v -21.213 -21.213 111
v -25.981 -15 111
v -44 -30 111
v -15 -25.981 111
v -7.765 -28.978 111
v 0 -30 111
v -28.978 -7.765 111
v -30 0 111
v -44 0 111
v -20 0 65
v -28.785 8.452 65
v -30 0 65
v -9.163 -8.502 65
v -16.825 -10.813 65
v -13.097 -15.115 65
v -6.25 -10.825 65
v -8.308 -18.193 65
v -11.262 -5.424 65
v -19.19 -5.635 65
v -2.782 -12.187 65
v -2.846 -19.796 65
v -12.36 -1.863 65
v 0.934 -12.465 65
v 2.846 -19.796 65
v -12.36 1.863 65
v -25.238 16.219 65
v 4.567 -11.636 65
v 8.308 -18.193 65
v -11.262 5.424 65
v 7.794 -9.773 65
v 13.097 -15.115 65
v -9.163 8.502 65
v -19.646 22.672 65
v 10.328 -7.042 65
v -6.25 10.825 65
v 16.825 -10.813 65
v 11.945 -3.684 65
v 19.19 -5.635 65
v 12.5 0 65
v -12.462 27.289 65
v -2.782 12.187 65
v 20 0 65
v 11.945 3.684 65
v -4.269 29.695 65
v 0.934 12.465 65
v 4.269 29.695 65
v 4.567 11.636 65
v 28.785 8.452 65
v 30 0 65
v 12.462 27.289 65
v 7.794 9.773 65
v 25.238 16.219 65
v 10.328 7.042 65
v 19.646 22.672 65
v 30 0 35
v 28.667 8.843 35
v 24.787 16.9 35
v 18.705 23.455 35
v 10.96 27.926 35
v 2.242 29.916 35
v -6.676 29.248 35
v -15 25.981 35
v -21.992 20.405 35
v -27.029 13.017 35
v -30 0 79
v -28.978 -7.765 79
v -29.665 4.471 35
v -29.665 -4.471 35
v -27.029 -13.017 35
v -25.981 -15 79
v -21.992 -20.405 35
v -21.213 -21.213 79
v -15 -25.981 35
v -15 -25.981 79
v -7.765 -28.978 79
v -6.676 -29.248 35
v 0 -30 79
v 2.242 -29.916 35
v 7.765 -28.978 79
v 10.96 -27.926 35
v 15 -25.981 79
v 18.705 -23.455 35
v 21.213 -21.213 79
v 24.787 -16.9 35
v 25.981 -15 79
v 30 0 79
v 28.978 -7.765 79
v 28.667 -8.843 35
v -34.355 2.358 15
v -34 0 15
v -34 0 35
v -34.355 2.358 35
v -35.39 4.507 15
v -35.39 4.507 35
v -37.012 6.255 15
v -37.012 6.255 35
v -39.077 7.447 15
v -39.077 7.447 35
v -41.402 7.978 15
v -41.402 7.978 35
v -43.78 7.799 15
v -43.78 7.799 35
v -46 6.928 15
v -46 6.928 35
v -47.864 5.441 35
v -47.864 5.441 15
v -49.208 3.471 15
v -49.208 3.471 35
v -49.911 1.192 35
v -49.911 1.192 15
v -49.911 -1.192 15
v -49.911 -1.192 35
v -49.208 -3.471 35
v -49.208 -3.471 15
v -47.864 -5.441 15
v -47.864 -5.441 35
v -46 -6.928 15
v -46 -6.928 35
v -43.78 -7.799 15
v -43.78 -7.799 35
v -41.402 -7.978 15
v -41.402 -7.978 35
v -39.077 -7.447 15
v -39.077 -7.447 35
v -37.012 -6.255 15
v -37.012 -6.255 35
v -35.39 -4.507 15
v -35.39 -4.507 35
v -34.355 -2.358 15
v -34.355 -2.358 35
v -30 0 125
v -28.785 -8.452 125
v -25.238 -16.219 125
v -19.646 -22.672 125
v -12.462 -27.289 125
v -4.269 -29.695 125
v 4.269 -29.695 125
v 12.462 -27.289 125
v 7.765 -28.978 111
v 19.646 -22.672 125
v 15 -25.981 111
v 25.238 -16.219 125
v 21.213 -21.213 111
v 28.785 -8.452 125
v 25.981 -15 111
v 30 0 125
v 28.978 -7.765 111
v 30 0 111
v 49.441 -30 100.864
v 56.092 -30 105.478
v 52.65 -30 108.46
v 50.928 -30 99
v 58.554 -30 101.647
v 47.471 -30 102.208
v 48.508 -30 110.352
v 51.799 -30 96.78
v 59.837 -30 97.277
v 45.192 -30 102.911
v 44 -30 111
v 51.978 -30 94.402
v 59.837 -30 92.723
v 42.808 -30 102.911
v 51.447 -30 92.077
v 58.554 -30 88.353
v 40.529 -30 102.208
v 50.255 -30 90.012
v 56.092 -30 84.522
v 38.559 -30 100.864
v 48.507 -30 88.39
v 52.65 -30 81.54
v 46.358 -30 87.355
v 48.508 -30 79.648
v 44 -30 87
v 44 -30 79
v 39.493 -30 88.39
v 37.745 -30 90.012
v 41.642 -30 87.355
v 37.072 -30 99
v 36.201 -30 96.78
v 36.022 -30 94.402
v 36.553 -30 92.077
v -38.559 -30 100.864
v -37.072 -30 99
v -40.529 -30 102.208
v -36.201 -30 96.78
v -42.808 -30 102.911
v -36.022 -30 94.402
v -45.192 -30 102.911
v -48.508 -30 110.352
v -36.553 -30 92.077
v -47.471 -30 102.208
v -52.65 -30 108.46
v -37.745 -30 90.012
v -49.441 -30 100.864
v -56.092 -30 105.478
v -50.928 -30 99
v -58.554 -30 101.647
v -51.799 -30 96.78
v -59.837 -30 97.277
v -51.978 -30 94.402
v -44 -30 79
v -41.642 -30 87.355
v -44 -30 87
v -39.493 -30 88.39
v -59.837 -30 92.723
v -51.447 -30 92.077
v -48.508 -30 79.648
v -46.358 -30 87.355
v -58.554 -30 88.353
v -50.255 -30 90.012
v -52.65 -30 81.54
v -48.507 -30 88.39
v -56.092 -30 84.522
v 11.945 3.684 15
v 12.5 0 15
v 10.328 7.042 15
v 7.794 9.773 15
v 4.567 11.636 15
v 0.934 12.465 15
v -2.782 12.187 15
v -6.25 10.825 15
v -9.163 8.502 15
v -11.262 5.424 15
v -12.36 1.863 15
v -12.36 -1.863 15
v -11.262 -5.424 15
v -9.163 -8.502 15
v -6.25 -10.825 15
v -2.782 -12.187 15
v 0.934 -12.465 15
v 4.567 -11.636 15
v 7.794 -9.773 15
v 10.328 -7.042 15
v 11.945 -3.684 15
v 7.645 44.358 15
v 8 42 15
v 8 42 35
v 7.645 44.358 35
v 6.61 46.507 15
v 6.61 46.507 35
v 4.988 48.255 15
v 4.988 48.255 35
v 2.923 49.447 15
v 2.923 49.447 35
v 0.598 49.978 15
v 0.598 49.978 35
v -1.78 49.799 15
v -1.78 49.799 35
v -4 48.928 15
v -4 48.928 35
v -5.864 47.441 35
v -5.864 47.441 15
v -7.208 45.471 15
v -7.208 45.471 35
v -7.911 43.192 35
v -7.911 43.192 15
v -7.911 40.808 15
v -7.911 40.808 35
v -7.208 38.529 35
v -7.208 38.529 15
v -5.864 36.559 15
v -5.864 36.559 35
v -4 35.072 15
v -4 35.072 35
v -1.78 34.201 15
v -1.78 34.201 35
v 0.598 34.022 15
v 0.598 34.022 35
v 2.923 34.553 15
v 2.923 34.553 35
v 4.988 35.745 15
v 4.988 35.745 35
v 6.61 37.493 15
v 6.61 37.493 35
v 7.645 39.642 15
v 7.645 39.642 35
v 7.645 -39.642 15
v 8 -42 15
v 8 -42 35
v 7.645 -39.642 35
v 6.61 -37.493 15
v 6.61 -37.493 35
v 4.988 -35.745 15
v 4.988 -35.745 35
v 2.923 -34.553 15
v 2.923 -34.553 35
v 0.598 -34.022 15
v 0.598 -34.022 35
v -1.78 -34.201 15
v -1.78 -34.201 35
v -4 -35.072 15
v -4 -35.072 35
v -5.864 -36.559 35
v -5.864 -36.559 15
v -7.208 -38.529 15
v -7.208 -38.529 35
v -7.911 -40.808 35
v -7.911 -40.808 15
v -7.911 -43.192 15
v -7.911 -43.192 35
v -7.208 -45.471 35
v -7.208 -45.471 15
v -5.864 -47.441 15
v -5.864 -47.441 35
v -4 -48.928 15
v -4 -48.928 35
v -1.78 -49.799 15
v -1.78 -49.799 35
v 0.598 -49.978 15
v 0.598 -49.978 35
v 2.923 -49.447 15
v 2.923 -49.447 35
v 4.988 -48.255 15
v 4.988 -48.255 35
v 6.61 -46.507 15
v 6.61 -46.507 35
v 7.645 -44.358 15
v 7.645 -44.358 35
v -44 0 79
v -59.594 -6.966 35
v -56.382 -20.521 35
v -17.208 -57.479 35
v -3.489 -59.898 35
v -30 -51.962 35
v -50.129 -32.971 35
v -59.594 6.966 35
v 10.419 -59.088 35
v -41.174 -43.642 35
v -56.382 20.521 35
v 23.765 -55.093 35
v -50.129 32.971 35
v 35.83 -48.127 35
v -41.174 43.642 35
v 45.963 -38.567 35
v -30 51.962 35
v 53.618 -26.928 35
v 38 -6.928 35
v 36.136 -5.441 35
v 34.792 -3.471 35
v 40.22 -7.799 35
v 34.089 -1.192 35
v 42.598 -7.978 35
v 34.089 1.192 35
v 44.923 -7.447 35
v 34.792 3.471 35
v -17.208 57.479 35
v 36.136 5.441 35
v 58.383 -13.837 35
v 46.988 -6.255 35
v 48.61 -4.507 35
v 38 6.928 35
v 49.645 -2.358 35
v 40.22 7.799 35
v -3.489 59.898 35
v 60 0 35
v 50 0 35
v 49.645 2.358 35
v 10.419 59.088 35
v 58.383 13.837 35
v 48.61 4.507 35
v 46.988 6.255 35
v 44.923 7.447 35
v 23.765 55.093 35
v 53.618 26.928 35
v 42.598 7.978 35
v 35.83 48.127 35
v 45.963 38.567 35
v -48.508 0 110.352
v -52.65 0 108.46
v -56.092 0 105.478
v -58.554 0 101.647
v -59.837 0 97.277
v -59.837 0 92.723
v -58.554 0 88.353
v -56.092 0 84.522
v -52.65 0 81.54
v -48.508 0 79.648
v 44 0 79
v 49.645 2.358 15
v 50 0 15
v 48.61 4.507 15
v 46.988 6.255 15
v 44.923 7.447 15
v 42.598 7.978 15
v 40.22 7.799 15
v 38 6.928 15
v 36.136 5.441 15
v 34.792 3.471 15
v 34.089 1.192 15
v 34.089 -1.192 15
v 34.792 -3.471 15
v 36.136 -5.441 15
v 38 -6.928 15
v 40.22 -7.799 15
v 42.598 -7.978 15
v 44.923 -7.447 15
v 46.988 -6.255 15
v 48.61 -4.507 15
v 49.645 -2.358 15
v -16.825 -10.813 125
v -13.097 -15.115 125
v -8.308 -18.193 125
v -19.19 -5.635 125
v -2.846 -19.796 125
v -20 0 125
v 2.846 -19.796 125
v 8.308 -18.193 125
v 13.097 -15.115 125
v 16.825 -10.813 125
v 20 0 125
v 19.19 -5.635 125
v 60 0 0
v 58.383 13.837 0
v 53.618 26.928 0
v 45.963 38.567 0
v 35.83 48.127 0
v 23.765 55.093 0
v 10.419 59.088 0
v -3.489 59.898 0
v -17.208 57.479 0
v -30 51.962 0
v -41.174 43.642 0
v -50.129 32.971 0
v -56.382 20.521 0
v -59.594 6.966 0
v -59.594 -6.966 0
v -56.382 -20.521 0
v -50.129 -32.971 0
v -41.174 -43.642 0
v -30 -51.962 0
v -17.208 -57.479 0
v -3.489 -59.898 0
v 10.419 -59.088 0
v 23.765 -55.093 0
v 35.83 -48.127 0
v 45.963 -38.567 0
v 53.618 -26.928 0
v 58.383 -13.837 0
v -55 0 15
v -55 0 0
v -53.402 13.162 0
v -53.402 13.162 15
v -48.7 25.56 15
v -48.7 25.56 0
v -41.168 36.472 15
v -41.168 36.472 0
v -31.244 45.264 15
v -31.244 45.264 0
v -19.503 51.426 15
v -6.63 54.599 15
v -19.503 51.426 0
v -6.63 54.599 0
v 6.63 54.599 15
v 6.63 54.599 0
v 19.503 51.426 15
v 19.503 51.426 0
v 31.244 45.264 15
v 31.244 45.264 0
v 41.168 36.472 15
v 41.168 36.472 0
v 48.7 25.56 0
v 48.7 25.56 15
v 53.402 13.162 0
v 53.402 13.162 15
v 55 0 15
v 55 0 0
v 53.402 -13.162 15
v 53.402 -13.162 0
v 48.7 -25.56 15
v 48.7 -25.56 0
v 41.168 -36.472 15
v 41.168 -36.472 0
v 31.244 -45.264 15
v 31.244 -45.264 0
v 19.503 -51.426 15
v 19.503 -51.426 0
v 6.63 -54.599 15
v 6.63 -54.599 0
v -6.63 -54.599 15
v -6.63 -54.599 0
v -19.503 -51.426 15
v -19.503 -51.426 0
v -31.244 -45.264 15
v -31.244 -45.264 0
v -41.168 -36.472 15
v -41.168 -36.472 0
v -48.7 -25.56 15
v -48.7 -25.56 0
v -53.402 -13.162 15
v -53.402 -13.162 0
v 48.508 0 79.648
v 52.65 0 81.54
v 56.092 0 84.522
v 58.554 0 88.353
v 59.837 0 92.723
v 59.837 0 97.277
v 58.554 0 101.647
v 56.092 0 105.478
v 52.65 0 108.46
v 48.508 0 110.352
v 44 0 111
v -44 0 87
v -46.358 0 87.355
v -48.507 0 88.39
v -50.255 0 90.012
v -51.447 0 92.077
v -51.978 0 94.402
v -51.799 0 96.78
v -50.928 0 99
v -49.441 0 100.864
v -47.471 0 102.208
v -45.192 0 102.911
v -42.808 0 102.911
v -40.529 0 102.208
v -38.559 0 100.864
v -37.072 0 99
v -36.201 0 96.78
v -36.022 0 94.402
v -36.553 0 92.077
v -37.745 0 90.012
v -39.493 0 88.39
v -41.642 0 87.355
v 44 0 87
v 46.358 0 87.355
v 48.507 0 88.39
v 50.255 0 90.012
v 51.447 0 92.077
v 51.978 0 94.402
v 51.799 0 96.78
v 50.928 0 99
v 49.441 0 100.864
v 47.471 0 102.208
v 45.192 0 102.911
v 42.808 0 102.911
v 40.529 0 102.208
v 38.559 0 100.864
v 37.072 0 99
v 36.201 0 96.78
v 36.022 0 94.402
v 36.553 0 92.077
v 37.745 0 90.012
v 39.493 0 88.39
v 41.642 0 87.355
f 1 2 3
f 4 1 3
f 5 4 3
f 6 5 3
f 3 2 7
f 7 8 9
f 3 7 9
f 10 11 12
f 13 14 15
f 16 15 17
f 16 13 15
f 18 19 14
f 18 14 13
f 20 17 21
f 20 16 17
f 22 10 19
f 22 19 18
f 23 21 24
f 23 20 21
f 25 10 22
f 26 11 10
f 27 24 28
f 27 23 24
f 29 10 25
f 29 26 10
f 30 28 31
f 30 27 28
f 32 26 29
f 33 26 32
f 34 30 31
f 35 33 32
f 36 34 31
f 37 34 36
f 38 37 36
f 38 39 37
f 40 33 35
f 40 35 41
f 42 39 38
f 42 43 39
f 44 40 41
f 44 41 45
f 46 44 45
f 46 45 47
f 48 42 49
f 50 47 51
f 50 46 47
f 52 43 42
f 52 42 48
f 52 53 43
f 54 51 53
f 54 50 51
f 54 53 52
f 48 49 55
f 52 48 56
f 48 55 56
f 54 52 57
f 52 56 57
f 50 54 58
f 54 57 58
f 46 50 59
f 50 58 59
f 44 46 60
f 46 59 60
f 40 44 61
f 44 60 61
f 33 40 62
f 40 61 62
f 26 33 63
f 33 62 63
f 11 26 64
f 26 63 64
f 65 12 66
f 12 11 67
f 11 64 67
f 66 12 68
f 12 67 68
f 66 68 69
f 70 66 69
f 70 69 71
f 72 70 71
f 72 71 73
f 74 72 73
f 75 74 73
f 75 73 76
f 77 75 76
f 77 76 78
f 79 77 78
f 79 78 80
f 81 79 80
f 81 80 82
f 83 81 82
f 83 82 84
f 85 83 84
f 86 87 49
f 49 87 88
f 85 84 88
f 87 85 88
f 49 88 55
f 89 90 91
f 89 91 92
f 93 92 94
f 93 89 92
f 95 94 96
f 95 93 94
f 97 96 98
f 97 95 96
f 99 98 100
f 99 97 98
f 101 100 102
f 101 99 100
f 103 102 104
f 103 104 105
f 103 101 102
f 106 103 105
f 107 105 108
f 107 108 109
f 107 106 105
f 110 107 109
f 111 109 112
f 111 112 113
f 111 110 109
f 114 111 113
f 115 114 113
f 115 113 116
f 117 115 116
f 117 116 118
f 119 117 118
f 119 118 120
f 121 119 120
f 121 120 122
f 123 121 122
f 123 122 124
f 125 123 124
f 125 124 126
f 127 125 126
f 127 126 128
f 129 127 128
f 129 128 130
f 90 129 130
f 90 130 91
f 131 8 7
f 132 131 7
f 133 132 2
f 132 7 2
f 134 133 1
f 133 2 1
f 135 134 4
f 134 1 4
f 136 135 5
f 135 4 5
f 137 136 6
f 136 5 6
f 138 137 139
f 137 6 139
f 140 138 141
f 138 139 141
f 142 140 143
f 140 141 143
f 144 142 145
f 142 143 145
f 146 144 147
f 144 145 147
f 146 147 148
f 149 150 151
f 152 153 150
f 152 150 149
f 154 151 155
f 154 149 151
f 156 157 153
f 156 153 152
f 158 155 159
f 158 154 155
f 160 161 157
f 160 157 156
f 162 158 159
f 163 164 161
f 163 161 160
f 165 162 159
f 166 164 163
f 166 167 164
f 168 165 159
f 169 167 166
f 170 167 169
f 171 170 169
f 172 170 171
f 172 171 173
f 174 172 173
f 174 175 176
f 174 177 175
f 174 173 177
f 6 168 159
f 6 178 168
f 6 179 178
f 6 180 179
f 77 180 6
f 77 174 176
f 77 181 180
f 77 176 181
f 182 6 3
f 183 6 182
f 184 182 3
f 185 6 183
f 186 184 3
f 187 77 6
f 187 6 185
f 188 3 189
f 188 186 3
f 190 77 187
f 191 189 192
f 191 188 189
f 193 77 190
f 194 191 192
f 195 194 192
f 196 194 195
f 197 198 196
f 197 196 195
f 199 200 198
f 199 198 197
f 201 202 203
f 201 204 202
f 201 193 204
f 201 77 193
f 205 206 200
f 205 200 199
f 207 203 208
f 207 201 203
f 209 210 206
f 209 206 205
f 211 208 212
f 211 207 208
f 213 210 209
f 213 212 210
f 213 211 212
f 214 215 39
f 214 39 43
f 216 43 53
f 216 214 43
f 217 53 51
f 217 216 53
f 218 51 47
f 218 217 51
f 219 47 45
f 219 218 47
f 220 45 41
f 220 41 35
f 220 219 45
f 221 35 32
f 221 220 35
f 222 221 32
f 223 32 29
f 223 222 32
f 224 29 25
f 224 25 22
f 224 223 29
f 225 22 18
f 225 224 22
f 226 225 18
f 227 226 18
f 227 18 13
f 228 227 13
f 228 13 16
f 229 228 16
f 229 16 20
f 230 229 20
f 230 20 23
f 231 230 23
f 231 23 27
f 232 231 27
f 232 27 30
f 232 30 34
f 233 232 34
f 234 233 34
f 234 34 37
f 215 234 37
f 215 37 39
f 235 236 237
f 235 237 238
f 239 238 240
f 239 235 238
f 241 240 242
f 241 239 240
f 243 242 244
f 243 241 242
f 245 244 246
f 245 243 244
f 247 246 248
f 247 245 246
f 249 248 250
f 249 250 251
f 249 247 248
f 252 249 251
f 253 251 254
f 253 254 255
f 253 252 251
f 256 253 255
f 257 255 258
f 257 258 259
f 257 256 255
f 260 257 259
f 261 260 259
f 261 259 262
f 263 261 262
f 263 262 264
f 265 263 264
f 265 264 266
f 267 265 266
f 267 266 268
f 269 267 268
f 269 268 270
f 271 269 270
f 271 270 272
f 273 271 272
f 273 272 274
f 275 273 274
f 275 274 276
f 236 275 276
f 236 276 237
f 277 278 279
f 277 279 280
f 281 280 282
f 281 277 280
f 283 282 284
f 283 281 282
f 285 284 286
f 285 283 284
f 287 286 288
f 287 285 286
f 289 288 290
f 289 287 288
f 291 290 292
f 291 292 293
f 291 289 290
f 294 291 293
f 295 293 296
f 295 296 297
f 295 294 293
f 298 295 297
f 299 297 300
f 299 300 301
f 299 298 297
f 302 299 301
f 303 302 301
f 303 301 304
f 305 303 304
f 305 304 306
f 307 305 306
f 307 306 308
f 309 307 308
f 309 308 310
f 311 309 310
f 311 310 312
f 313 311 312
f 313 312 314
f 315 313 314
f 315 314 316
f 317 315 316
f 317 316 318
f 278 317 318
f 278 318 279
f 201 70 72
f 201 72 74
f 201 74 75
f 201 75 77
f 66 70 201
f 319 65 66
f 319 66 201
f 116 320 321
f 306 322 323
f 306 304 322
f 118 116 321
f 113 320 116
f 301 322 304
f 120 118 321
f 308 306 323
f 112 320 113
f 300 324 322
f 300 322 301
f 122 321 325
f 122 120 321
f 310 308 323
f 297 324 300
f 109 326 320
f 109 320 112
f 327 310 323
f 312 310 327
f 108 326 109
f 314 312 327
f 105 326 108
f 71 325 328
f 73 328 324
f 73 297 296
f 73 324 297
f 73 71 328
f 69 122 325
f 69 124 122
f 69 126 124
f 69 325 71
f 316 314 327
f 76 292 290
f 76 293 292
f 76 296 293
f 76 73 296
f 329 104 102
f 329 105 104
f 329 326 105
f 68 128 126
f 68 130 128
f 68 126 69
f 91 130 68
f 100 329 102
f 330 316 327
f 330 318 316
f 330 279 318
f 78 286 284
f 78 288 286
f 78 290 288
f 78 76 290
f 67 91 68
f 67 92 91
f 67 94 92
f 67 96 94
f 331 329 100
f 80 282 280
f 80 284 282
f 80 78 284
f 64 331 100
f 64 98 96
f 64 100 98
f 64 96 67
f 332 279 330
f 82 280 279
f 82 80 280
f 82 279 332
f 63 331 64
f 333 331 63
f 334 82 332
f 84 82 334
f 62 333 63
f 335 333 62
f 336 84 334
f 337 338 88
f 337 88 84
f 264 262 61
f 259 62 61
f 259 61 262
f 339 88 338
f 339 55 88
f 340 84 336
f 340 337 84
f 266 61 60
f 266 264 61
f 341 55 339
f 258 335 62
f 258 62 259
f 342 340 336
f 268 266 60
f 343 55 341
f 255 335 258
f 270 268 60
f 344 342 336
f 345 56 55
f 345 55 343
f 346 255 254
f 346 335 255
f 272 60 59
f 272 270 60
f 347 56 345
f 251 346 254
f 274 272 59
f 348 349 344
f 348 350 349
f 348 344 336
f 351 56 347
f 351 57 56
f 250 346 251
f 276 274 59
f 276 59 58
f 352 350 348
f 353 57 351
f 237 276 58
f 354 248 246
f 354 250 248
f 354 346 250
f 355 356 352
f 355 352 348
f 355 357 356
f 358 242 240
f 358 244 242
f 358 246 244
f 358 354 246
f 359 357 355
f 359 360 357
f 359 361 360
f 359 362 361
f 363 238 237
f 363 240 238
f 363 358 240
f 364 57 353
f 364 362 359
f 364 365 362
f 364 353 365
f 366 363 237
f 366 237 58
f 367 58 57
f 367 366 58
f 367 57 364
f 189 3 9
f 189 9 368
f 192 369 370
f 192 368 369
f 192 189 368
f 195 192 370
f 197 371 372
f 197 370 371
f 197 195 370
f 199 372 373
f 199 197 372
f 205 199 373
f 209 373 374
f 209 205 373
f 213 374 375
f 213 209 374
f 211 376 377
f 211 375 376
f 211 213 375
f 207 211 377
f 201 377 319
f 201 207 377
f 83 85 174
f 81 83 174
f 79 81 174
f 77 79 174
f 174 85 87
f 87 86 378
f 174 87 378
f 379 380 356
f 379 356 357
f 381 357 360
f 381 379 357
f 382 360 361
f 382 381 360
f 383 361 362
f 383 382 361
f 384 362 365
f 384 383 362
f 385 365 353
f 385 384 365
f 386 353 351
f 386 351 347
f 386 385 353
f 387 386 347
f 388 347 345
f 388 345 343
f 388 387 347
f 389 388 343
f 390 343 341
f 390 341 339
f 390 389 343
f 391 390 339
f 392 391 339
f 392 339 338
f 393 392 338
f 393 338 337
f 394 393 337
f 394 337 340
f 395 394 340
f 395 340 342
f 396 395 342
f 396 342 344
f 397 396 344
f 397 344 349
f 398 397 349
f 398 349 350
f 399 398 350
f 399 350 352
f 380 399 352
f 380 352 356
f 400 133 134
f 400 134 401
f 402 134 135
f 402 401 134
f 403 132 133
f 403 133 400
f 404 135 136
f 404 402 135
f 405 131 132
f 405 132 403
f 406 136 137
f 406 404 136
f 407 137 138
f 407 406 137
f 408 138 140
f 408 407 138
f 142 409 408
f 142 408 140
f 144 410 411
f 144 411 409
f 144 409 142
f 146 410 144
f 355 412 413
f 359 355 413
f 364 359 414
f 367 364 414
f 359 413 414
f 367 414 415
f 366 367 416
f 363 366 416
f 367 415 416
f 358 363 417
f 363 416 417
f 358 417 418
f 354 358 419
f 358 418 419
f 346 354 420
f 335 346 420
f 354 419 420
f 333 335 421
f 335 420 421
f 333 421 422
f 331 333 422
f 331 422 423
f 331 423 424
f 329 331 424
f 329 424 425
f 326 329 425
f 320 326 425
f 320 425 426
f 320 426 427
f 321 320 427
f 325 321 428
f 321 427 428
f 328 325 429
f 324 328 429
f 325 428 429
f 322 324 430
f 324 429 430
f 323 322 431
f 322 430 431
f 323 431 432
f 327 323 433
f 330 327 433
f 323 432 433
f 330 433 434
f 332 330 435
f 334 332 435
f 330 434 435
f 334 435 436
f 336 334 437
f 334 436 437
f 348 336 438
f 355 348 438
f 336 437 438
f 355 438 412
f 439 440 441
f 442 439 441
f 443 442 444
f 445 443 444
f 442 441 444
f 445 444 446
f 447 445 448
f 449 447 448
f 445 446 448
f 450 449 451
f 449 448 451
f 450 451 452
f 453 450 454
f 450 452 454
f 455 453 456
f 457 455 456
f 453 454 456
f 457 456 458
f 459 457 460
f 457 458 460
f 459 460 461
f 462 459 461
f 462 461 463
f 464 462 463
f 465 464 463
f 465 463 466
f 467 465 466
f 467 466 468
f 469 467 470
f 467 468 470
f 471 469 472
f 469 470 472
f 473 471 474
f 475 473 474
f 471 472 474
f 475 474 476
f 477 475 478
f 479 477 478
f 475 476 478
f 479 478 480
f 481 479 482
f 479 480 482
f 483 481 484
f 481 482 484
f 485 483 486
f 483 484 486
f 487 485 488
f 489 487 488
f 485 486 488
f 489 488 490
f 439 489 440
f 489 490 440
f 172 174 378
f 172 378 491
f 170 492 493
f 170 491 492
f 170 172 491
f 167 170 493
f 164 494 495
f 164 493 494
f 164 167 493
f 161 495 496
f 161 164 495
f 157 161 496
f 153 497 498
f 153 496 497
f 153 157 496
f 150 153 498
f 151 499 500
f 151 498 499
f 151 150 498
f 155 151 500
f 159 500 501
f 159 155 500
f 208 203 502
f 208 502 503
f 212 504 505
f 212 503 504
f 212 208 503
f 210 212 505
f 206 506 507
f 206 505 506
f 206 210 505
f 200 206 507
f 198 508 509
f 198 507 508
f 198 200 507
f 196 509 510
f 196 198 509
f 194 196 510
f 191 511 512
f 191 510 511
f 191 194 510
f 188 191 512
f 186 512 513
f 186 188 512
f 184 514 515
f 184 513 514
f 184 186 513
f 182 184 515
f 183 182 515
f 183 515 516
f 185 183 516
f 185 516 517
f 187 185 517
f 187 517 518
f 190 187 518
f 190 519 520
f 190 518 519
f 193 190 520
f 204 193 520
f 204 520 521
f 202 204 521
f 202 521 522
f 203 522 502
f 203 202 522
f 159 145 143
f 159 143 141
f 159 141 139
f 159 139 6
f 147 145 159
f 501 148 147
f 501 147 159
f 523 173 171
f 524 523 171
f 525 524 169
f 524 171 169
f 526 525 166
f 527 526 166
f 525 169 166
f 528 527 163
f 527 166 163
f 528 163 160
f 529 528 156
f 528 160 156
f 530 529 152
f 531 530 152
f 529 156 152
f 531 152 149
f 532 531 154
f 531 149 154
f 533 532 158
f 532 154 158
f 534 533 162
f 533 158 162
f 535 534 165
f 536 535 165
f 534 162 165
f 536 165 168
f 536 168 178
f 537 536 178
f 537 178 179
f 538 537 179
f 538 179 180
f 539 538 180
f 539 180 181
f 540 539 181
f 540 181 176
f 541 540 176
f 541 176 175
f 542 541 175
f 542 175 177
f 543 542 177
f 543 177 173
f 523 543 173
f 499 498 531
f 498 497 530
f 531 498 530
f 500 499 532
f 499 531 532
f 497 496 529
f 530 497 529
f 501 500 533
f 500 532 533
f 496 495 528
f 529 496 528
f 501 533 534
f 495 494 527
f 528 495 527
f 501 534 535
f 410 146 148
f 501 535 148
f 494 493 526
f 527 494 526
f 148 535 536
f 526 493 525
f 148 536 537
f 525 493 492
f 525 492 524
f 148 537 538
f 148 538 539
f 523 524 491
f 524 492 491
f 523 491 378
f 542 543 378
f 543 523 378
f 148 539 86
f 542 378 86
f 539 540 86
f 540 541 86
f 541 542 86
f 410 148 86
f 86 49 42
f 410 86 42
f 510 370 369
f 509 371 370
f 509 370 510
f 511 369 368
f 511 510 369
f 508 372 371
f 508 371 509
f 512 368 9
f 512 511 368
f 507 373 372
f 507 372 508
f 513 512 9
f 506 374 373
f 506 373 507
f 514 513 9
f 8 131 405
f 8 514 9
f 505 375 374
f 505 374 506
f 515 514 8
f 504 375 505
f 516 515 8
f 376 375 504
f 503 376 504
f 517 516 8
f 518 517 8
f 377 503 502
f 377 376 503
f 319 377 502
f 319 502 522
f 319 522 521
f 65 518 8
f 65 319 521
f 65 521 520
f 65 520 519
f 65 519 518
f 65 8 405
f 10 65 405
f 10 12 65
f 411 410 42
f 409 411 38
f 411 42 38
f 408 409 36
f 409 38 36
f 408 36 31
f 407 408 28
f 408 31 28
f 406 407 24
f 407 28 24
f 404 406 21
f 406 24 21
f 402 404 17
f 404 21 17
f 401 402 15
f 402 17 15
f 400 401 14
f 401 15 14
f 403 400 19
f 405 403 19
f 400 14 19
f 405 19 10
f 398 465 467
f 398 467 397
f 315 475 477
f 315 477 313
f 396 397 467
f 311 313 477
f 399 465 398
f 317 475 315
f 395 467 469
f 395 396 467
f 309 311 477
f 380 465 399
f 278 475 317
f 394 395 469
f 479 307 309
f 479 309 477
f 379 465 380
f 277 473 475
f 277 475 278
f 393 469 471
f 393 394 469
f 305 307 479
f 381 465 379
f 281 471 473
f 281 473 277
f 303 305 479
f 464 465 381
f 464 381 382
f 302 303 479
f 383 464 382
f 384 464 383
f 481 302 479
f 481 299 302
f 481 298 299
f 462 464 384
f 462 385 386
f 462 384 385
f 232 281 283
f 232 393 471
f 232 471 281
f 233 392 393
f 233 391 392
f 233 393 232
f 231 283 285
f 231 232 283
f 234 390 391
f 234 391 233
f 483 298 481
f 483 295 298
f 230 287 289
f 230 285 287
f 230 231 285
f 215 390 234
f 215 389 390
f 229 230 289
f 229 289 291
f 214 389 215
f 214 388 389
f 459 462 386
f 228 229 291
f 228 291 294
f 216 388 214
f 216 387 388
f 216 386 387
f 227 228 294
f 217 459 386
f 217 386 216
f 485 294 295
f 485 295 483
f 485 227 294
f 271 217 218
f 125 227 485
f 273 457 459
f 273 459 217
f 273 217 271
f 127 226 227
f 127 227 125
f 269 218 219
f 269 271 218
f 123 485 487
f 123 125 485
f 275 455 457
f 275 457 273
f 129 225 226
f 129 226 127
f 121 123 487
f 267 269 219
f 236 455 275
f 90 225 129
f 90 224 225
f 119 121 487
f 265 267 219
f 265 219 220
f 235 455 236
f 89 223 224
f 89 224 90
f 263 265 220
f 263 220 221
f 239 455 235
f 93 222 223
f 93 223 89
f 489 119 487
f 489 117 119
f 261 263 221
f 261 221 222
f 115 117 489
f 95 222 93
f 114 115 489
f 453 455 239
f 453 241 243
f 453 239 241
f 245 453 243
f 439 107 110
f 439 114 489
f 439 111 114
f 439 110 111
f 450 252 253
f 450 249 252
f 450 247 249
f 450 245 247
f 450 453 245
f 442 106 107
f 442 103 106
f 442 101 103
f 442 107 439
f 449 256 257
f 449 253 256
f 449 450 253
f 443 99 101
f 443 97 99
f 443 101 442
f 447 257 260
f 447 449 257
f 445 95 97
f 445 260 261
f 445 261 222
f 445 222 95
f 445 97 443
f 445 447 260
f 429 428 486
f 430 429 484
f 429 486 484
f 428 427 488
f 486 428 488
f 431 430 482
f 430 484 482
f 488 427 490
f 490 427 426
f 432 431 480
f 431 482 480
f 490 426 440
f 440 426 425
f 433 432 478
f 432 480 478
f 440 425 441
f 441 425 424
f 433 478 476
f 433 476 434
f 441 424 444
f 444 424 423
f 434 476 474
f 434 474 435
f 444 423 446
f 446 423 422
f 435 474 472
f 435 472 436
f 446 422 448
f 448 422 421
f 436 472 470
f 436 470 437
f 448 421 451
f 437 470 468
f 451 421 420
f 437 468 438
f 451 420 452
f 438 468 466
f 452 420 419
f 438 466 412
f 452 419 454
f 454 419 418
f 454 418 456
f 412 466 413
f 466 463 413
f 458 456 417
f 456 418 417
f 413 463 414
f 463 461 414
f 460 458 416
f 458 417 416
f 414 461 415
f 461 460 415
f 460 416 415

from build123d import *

# Parameters (mm, degrees)
BOSS_EXTRUDE1_DEPTH         = 125
SKETCH1_3_R                 = 12.5
BOSS_EXTRUDE2_DEPTH         = 65
SKETCH1_4_R                 = 60
SKETCH1_4_R_2               = 8
SKETCH1_4_R_3               = 30
BOSS_EXTRUDE3_DEPTH         = 35
BOSS_EXTRUDE4_START         = -46
BOSS_EXTRUDE4_DEPTH         = 32
FILLET1_RADIUS              = 16
FILLET1_LENGTH              = 30
F_16_0MM_DOWEL_HOLE1_D      = 16
FILLET1_OF_MIRROR1_2_RADIUS = 16
FILLET1_OF_MIRROR1_2_LENGTH = 30
SKETCH4_R                   = 55
CUT_EXTRUDE1_DEPTH          = 15


with BuildPart() as part:
    # Sketch1 → Boss-Extrude1 (new body)
    with BuildSketch(Plane.XY):
        with BuildLine():
            ThreePointArc((20, 0), (0, -20), (-20, 0))
            Line((-20, 0), (-30, 0))
            ThreePointArc((-30, 0), (0, -30), (30, 0))
            Line((30, 0), (20, 0))
        make_face()
    extrude(amount=BOSS_EXTRUDE1_DEPTH)

    # Sketch1<3> → Boss-Extrude2 (add)
    with BuildSketch(Plane.XY):
        with BuildLine():
            Line((-30, 0), (-20, 0))
            ThreePointArc((-20, 0), (0, -20), (20, 0))
            Line((20, 0), (30, 0))
            ThreePointArc((30, 0), (0, 30), (-30, 0))
        make_face()
        Circle(SKETCH1_3_R, mode=Mode.SUBTRACT)
    extrude(amount=BOSS_EXTRUDE2_DEPTH)

    # Sketch1<4> → Boss-Extrude3 (add)
    with BuildSketch(Plane.XY):
        Circle(SKETCH1_4_R)
        with Locations((0, 42)):
            Circle(SKETCH1_4_R_2, mode=Mode.SUBTRACT)
        with Locations((-42, 0)):
            Circle(SKETCH1_4_R_2, mode=Mode.SUBTRACT)
        with Locations((0, -42)):
            Circle(SKETCH1_4_R_2, mode=Mode.SUBTRACT)
        with Locations((42, 0)):
            Circle(SKETCH1_4_R_2, mode=Mode.SUBTRACT)
        Circle(SKETCH1_4_R_3, mode=Mode.SUBTRACT)
    extrude(amount=BOSS_EXTRUDE3_DEPTH)

    # Sketch2 → Boss-Extrude4 (add)
    with BuildSketch(Plane.XY.offset(125).offset(BOSS_EXTRUDE4_START)):
        with BuildLine():
            Line((60, 0), (30, 0))
            ThreePointArc((30, 0), (21.213203436, -21.213203436), (0, -30))
            Line((0, -30), (60, -30))
            Line((60, -30), (60, 0))
        make_face()
    boss_extrude4 = extrude(amount=BOSS_EXTRUDE4_DEPTH)

    # Fillet1: full round fillet: the end face becomes a half cylinder, R = half its width
    fillet1_face = Plane((60, -15, 95), x_dir=(0, -1, 0), z_dir=(1, 0, 0))  # on the end face: x along it, z out of the body
    fillet1_slab = fillet1_face.offset(-FILLET1_RADIUS / 2) * Box(FILLET1_LENGTH, 2 * FILLET1_RADIUS, FILLET1_RADIUS, mode=Mode.PRIVATE)  # the body's end, R deep
    fillet1_round = Plane((44, -15, 95), x_dir=(1, 0, 0), z_dir=(0, -1, 0)) * Cylinder(FILLET1_RADIUS, FILLET1_LENGTH, mode=Mode.PRIVATE)  # its axis R under the face
    add(fillet1_slab - fillet1_round, mode=Mode.SUBTRACT)

    # Ø16.0mm Dowel Hole1 (through all)
    with Locations(Plane(origin=(44, 0, 95), x_dir=(0, 0, 1), z_dir=(0, 1, 0))):
        with Locations((0, 0)):
            f_16_0mm_dowel_hole1 = Hole(F_16_0MM_DOWEL_HOLE1_D / 2)

    # Mirror1: Boss-Extrude4, Ø16.0mm Dowel Hole1 across plane
    add(boss_extrude4.mirror(Plane(origin=(0, 0, 0), x_dir=(0, 0, 1), z_dir=(1, 0, 0))))
    add(f_16_0mm_dowel_hole1.mirror(Plane(origin=(0, 0, 0), x_dir=(0, 0, 1), z_dir=(1, 0, 0))), mode=Mode.SUBTRACT)

    # Fillet1 of Mirror1 2: full round fillet: the end face becomes a half cylinder, R = half its width
    fillet1_of_mirror1_2_face = Plane((-60, -15, 95), x_dir=(0, -1, 0), z_dir=(-1, 0, 0))  # on the end face: x along it, z out of the body
    fillet1_of_mirror1_2_slab = fillet1_of_mirror1_2_face.offset(-FILLET1_OF_MIRROR1_2_RADIUS / 2) * Box(FILLET1_OF_MIRROR1_2_LENGTH, 2 * FILLET1_OF_MIRROR1_2_RADIUS, FILLET1_OF_MIRROR1_2_RADIUS, mode=Mode.PRIVATE)  # the body's end, R deep
    fillet1_of_mirror1_2_round = Plane((-44, -15, 95), x_dir=(-1, 0, 0), z_dir=(0, -1, 0)) * Cylinder(FILLET1_OF_MIRROR1_2_RADIUS, FILLET1_OF_MIRROR1_2_LENGTH, mode=Mode.PRIVATE)  # its axis R under the face
    add(fillet1_of_mirror1_2_slab - fillet1_of_mirror1_2_round, mode=Mode.SUBTRACT)

    # Sketch4 → Cut-Extrude1 (cut)
    with BuildSketch(Plane(origin=(0, 0, 0), x_dir=(-1, 0, 0), z_dir=(0, 0, -1))):
        Circle(SKETCH4_R)
    extrude(amount=-CUT_EXTRUDE1_DEPTH, mode=Mode.SUBTRACT)


solid = part.part
